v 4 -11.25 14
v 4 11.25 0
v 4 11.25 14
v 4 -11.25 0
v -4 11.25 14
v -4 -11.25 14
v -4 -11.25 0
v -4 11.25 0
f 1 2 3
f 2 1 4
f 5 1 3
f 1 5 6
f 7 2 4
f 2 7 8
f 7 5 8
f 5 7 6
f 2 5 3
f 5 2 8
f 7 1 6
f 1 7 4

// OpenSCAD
use <../helpers.scad>
use <new-chain.scad>

//CHAINTYPE
function CHAINTYPE_STD()    = ["CHAINTYPE", 15.0, 12.5,  9.0, 2.5, 2.5,  8.0,  45.0];

function CC_CHAINTYPE_pivotlength(t) = t[1];
function CC_CHAINTYPE_cablewidth(t) = t[2];
function CC_CHAINTYPE_cableheight(t) = t[3];
function CC_CHAINTYPE_sidewall(t) = t[4];
function CC_CHAINTYPE_verticalwall(t) = t[5];
function CC_CHAINTYPE_centerlength(t) = t[6];
function CC_CHAINTYPE_maximumangle(t) = t[7];


//CC_LINKSECTIONTYPE
function CC_LINKSECTIONTYPE_MALE()     = ["CC_LINKSECTIONTYPE_MALE"];
function CC_LINKSECTIONTYPE_FEMALE()   = ["CC_LINKSECTIONTYPE_FEMALE"];

cc_chainlink(CHAINTYPE_STD(), CC_LINKSECTIONTYPE_MALE(), CC_LINKSECTIONTYPE_FEMALE());

module cc_chainlink(chaintype, link1, link2)
{
  centerlen = CC_CHAINTYPE_centerlength(chaintype);
  cablew = CC_CHAINTYPE_cablewidth(chaintype);
  cableh = CC_CHAINTYPE_cableheight(chaintype);
  sidewall = CC_CHAINTYPE_sidewall(chaintype);
  vertwall = CC_CHAINTYPE_verticalwall(chaintype);
  
  difference()
  {
    union()
    {
      cube_extent(
          -centerlen/2, centerlen/2,
          -cablew/2-2*sidewall, cablew/2+2*sidewall,
          0, cableh + 2*vertwall
        );
    }
  }
  
  cc_section(chaintype, link1);
  
  rotate([0,0,180])
  cc_section(chaintype, link2);
}

module cc_section(chaintype, linksectiontype)
{
  if (linksectiontype[0] == "CC_LINKSECTIONTYPE_MALE")
    cc_section_male(chaintype);
  else if (linksectiontype[0] == "CC_LINKSECTIONTYPE_FEMALE")
    cc_section_female(chaintype);
}

module cc_section_male(chaintype)
{
  
}

module cc_section_female(chaintype)
{
  
}
